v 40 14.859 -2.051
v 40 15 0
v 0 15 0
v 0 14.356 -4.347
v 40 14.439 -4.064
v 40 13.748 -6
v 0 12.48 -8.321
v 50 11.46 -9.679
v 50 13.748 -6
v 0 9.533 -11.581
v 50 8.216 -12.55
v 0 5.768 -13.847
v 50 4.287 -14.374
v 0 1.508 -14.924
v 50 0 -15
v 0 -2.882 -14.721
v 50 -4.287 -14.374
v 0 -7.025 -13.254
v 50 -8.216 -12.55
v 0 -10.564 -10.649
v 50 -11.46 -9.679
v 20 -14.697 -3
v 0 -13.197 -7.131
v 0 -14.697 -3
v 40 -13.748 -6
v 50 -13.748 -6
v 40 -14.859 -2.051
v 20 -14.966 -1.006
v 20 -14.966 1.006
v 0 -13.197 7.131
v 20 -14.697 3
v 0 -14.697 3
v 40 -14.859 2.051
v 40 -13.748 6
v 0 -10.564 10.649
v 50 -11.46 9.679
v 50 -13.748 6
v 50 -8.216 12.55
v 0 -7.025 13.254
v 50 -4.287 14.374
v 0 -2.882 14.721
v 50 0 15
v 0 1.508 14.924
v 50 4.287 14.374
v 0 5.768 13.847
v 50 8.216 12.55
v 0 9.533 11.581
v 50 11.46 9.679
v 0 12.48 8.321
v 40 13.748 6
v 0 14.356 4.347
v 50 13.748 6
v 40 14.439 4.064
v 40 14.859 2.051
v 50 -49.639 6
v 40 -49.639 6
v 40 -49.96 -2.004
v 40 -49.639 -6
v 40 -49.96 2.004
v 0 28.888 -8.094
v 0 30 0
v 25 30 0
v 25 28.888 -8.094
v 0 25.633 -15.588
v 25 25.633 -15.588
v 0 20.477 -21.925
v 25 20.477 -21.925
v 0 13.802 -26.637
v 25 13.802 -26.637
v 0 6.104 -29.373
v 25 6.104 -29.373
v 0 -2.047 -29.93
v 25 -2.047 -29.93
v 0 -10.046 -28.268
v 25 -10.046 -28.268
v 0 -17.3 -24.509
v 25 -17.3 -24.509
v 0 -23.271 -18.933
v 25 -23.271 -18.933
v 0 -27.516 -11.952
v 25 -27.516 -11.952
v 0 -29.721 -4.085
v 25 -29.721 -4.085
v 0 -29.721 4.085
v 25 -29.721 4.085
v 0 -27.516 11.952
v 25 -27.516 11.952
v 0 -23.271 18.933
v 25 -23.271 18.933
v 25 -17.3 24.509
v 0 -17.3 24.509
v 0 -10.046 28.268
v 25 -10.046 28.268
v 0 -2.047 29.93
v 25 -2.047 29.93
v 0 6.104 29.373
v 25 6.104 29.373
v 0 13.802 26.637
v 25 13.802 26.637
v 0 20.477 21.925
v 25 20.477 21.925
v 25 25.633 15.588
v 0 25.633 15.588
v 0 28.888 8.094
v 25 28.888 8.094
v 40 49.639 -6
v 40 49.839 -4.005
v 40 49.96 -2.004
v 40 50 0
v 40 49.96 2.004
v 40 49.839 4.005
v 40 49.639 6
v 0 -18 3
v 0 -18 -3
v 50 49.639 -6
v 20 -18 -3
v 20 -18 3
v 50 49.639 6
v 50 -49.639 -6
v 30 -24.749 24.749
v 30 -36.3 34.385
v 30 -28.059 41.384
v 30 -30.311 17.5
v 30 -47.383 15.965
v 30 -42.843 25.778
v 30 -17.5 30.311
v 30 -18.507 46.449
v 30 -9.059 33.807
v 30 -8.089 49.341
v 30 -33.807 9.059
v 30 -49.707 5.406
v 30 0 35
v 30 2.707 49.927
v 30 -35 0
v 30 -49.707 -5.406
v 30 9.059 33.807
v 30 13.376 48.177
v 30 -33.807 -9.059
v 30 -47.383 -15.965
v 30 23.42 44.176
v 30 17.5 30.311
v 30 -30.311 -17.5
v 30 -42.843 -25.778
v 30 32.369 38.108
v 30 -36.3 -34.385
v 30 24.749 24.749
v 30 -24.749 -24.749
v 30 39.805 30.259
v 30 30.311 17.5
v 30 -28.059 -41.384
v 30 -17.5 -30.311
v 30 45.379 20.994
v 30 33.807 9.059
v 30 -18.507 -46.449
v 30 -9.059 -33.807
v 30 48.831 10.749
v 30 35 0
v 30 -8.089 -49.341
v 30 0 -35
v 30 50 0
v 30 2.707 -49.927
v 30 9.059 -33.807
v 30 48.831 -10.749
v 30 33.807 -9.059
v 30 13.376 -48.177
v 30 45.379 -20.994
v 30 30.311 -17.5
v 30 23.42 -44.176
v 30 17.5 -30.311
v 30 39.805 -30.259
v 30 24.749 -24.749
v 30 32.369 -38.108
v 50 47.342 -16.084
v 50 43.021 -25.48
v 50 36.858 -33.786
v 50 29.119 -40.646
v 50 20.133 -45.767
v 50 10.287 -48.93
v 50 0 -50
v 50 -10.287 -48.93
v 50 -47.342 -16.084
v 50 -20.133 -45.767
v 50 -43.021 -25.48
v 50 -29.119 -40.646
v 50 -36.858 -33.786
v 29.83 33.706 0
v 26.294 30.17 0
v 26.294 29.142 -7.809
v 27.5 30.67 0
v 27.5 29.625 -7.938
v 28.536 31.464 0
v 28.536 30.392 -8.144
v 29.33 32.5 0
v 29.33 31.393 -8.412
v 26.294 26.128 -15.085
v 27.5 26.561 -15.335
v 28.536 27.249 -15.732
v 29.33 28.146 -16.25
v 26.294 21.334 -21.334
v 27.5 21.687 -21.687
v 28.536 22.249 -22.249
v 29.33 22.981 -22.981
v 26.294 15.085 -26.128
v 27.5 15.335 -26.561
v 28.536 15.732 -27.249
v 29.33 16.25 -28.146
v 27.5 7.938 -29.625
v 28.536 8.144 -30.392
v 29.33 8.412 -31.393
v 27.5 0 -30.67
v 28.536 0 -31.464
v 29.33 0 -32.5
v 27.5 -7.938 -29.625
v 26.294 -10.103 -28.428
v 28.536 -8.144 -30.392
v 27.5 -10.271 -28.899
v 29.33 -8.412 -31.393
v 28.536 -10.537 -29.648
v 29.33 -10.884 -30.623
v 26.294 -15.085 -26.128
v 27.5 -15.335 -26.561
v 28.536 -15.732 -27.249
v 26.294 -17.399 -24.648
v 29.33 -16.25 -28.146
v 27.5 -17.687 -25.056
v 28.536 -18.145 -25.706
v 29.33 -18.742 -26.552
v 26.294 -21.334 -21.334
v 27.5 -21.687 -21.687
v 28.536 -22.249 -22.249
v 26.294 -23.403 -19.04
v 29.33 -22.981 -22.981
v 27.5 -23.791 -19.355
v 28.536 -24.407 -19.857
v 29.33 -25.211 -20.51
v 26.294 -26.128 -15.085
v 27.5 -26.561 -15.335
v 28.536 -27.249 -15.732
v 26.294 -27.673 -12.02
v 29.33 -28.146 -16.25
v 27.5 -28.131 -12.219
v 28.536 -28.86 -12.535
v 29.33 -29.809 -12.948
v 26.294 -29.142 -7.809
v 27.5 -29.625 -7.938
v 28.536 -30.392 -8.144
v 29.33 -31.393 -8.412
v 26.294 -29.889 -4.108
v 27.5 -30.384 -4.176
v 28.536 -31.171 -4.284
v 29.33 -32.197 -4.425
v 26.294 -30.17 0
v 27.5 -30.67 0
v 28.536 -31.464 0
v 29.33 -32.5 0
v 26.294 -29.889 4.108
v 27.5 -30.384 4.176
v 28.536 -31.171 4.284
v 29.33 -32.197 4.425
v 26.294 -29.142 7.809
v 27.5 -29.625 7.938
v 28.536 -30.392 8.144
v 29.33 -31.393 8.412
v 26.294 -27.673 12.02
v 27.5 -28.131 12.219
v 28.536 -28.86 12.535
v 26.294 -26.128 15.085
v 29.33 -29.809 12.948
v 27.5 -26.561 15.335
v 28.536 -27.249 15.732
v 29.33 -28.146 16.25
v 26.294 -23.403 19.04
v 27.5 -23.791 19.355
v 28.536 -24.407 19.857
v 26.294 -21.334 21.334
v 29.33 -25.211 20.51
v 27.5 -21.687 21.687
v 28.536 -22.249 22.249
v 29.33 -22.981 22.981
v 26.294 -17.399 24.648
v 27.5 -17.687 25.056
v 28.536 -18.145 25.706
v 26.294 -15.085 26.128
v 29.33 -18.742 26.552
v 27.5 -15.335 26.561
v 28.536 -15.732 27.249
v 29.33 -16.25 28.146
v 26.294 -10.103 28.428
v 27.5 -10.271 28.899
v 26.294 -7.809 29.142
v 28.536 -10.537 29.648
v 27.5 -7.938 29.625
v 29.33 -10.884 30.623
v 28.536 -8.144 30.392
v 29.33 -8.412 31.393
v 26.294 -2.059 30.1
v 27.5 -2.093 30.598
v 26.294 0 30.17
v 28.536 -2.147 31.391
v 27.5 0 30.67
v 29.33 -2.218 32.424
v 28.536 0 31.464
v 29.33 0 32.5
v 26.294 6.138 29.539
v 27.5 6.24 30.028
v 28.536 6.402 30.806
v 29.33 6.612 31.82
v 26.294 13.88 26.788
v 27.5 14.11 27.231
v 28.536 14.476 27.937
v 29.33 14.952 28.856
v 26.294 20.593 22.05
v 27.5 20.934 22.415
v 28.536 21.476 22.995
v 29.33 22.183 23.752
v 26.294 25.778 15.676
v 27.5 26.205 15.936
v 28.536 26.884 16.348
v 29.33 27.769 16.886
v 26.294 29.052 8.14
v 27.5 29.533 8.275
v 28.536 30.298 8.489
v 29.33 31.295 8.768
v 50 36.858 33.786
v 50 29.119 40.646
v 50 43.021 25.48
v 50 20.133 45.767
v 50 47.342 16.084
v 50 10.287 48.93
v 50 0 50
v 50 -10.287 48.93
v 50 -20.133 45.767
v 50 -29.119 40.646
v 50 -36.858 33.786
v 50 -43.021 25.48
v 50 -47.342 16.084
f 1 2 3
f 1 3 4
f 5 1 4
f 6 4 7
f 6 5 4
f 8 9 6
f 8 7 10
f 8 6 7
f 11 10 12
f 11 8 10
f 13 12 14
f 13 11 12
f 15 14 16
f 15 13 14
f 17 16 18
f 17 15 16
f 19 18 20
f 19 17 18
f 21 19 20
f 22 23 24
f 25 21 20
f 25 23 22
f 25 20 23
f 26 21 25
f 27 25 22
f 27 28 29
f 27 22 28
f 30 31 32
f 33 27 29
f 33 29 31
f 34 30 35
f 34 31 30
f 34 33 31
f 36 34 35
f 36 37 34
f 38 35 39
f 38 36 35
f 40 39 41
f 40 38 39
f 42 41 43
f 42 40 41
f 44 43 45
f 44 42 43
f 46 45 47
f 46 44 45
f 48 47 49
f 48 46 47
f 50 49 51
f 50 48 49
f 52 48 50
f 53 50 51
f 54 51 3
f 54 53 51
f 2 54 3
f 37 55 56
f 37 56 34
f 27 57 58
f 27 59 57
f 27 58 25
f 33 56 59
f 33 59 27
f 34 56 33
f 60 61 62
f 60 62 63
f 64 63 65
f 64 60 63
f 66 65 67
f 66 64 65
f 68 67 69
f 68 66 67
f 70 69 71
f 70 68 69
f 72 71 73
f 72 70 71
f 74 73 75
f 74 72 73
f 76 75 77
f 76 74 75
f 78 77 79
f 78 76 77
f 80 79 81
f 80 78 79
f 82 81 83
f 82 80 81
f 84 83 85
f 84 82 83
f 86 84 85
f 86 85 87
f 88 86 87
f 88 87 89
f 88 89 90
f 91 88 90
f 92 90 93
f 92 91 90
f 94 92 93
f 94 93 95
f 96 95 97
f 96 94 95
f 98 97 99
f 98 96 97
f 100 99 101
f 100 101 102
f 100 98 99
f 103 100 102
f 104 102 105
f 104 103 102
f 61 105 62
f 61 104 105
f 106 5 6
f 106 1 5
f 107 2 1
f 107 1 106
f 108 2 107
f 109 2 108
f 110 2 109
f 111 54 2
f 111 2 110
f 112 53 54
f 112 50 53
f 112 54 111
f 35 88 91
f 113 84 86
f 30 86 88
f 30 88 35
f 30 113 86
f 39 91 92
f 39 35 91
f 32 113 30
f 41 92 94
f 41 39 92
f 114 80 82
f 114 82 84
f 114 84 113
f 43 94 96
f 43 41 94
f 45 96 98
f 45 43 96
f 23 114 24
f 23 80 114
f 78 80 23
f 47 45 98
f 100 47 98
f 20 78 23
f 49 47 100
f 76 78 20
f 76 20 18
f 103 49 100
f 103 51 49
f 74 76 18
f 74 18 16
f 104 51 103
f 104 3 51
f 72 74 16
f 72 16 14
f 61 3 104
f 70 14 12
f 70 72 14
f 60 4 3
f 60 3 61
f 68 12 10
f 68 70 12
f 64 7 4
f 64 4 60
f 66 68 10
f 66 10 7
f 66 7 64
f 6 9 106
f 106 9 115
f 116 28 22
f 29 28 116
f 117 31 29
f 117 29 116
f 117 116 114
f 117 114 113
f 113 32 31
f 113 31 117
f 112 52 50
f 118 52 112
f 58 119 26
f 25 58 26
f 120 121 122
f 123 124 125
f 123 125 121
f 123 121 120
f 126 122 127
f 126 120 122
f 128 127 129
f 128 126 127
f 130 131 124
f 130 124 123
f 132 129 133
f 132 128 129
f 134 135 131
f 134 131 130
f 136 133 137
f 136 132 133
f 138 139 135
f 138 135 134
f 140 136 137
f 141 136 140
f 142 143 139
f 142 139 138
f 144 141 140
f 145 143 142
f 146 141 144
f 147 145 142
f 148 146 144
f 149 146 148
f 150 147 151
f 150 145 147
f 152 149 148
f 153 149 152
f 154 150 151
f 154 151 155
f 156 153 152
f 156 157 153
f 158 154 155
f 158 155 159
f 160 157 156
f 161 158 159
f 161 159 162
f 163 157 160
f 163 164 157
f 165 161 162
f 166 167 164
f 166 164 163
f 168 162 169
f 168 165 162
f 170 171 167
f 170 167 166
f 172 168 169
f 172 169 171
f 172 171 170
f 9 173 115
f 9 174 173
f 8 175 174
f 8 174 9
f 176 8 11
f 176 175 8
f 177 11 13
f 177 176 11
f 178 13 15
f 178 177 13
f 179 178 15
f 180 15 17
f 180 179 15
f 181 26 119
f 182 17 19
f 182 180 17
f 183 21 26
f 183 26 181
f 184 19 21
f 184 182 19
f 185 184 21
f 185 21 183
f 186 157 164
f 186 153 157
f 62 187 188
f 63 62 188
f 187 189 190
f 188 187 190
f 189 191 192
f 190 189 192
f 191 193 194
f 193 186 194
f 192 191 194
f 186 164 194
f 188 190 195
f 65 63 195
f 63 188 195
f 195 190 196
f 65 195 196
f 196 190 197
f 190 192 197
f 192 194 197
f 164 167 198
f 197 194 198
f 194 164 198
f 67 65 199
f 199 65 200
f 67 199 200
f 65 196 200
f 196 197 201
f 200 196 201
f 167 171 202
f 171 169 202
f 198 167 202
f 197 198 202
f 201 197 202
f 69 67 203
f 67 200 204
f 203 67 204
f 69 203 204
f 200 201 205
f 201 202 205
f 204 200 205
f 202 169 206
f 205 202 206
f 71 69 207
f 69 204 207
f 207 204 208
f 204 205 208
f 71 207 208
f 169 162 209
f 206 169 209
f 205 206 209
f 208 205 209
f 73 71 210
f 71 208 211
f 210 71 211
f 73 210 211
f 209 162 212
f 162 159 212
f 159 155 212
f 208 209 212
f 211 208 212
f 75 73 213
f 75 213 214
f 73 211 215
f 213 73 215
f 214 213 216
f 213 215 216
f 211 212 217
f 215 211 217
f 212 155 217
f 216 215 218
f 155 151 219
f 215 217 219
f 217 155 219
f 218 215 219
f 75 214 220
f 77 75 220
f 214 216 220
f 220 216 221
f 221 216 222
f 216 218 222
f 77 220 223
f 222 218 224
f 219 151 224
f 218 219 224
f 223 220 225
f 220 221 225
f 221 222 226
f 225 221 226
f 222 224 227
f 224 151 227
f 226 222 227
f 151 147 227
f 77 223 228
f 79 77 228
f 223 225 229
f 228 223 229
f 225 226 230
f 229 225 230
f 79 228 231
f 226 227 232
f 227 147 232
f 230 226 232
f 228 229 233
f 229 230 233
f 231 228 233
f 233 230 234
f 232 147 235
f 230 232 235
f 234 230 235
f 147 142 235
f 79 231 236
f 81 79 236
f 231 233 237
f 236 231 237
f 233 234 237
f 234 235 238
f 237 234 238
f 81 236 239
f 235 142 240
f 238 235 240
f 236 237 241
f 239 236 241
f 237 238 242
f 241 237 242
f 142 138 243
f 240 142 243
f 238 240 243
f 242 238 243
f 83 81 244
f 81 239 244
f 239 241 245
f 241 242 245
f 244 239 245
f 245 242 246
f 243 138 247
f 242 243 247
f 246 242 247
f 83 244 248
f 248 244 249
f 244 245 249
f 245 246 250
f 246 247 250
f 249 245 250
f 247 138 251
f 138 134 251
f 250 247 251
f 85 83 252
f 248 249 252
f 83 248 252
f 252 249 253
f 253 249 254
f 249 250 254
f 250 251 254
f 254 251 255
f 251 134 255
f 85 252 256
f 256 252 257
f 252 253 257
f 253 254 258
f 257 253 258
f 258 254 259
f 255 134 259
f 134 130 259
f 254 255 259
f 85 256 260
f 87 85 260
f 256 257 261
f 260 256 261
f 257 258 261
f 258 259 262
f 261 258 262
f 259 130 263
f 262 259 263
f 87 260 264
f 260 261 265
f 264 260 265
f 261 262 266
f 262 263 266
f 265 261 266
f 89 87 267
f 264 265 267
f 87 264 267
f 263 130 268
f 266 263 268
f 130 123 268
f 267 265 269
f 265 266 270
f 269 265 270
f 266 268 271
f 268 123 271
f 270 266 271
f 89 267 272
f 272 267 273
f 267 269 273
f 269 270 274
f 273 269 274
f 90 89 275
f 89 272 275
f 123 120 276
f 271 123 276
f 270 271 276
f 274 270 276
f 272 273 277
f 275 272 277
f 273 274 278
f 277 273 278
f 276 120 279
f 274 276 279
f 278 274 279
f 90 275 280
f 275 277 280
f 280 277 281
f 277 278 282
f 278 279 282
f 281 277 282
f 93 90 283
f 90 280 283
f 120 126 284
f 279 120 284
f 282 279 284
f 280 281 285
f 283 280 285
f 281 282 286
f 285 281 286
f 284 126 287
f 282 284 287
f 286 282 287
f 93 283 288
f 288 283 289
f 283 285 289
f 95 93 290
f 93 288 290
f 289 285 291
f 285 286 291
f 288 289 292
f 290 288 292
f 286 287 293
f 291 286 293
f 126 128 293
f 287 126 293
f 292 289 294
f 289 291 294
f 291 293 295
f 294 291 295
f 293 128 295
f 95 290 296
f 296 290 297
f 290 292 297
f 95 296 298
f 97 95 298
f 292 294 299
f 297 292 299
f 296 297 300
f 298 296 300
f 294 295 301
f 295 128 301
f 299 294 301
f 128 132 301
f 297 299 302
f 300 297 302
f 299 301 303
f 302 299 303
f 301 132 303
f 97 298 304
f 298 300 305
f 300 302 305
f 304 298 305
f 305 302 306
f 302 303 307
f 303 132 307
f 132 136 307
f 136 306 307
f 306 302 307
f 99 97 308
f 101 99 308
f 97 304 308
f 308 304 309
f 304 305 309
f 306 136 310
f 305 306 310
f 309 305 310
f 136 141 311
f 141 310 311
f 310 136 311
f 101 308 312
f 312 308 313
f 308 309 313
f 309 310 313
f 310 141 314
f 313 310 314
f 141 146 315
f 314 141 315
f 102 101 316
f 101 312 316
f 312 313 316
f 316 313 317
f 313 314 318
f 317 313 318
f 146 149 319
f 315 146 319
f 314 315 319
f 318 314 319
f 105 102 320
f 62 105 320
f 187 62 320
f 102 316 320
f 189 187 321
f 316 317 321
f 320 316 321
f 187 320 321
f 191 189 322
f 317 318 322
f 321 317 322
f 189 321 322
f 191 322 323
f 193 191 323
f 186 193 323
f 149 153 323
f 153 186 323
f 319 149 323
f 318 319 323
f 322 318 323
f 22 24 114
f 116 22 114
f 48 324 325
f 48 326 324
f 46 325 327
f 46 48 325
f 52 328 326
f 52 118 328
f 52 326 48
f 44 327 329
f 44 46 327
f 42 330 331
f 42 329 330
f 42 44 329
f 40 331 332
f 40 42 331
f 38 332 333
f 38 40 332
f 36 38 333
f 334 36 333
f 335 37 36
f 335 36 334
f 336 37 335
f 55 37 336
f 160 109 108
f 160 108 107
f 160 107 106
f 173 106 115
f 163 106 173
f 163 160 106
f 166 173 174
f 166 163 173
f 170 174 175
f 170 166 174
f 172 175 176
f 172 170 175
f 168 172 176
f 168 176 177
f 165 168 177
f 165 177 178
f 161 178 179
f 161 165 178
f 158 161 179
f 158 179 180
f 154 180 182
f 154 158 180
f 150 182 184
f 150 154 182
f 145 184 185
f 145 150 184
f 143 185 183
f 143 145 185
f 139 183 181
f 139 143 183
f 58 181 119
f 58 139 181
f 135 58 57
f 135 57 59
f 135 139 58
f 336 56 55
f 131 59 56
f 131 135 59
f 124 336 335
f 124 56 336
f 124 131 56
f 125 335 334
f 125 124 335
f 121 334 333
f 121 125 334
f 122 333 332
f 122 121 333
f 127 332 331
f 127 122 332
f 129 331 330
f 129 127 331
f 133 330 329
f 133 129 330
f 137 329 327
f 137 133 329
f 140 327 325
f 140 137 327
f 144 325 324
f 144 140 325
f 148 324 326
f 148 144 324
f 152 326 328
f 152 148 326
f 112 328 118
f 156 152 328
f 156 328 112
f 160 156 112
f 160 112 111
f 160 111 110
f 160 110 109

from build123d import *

# Parameters (mm, degrees)
F2_W     = 110
F2_H     = 12
F3_DEPTH = 10
F4_W     = 6
F4_H     = 6
F5_DEPTH = 20
F6_R     = 5


with BuildPart() as f1:
    # F0 (on Top) → F1 (revolve)
    with BuildSketch(Plane.XY):
        Polygon((0, 30), (0, 15), (50, 15), (50, 50), (30, 50), (30, 30), align=None)
    revolve(axis=Axis((25, 0, 0), (-1, 0, 0)))

    # F2 (on face) → F3 (cut)
    with BuildSketch(Plane.YZ.offset(50)):
        Rectangle(F2_W, F2_H)
    extrude(amount=-F3_DEPTH, mode=Mode.SUBTRACT)

    # F4 (on face) → F5 (cut)
    with BuildSketch(Plane(origin=(0, 0, 0), x_dir=(0, -1, 0), z_dir=(-1, 0, 0))):
        with Locations((15, 0)):
            Rectangle(F4_W, F4_H)
    extrude(amount=-F5_DEPTH, mode=Mode.SUBTRACT)

    # F6
    f6_edges = [f1.edges().sort_by_distance(p)[0] for p in [
        (30, -30, 0),
    ]]
    fillet(f6_edges, radius=F6_R)


solid = f1.part
